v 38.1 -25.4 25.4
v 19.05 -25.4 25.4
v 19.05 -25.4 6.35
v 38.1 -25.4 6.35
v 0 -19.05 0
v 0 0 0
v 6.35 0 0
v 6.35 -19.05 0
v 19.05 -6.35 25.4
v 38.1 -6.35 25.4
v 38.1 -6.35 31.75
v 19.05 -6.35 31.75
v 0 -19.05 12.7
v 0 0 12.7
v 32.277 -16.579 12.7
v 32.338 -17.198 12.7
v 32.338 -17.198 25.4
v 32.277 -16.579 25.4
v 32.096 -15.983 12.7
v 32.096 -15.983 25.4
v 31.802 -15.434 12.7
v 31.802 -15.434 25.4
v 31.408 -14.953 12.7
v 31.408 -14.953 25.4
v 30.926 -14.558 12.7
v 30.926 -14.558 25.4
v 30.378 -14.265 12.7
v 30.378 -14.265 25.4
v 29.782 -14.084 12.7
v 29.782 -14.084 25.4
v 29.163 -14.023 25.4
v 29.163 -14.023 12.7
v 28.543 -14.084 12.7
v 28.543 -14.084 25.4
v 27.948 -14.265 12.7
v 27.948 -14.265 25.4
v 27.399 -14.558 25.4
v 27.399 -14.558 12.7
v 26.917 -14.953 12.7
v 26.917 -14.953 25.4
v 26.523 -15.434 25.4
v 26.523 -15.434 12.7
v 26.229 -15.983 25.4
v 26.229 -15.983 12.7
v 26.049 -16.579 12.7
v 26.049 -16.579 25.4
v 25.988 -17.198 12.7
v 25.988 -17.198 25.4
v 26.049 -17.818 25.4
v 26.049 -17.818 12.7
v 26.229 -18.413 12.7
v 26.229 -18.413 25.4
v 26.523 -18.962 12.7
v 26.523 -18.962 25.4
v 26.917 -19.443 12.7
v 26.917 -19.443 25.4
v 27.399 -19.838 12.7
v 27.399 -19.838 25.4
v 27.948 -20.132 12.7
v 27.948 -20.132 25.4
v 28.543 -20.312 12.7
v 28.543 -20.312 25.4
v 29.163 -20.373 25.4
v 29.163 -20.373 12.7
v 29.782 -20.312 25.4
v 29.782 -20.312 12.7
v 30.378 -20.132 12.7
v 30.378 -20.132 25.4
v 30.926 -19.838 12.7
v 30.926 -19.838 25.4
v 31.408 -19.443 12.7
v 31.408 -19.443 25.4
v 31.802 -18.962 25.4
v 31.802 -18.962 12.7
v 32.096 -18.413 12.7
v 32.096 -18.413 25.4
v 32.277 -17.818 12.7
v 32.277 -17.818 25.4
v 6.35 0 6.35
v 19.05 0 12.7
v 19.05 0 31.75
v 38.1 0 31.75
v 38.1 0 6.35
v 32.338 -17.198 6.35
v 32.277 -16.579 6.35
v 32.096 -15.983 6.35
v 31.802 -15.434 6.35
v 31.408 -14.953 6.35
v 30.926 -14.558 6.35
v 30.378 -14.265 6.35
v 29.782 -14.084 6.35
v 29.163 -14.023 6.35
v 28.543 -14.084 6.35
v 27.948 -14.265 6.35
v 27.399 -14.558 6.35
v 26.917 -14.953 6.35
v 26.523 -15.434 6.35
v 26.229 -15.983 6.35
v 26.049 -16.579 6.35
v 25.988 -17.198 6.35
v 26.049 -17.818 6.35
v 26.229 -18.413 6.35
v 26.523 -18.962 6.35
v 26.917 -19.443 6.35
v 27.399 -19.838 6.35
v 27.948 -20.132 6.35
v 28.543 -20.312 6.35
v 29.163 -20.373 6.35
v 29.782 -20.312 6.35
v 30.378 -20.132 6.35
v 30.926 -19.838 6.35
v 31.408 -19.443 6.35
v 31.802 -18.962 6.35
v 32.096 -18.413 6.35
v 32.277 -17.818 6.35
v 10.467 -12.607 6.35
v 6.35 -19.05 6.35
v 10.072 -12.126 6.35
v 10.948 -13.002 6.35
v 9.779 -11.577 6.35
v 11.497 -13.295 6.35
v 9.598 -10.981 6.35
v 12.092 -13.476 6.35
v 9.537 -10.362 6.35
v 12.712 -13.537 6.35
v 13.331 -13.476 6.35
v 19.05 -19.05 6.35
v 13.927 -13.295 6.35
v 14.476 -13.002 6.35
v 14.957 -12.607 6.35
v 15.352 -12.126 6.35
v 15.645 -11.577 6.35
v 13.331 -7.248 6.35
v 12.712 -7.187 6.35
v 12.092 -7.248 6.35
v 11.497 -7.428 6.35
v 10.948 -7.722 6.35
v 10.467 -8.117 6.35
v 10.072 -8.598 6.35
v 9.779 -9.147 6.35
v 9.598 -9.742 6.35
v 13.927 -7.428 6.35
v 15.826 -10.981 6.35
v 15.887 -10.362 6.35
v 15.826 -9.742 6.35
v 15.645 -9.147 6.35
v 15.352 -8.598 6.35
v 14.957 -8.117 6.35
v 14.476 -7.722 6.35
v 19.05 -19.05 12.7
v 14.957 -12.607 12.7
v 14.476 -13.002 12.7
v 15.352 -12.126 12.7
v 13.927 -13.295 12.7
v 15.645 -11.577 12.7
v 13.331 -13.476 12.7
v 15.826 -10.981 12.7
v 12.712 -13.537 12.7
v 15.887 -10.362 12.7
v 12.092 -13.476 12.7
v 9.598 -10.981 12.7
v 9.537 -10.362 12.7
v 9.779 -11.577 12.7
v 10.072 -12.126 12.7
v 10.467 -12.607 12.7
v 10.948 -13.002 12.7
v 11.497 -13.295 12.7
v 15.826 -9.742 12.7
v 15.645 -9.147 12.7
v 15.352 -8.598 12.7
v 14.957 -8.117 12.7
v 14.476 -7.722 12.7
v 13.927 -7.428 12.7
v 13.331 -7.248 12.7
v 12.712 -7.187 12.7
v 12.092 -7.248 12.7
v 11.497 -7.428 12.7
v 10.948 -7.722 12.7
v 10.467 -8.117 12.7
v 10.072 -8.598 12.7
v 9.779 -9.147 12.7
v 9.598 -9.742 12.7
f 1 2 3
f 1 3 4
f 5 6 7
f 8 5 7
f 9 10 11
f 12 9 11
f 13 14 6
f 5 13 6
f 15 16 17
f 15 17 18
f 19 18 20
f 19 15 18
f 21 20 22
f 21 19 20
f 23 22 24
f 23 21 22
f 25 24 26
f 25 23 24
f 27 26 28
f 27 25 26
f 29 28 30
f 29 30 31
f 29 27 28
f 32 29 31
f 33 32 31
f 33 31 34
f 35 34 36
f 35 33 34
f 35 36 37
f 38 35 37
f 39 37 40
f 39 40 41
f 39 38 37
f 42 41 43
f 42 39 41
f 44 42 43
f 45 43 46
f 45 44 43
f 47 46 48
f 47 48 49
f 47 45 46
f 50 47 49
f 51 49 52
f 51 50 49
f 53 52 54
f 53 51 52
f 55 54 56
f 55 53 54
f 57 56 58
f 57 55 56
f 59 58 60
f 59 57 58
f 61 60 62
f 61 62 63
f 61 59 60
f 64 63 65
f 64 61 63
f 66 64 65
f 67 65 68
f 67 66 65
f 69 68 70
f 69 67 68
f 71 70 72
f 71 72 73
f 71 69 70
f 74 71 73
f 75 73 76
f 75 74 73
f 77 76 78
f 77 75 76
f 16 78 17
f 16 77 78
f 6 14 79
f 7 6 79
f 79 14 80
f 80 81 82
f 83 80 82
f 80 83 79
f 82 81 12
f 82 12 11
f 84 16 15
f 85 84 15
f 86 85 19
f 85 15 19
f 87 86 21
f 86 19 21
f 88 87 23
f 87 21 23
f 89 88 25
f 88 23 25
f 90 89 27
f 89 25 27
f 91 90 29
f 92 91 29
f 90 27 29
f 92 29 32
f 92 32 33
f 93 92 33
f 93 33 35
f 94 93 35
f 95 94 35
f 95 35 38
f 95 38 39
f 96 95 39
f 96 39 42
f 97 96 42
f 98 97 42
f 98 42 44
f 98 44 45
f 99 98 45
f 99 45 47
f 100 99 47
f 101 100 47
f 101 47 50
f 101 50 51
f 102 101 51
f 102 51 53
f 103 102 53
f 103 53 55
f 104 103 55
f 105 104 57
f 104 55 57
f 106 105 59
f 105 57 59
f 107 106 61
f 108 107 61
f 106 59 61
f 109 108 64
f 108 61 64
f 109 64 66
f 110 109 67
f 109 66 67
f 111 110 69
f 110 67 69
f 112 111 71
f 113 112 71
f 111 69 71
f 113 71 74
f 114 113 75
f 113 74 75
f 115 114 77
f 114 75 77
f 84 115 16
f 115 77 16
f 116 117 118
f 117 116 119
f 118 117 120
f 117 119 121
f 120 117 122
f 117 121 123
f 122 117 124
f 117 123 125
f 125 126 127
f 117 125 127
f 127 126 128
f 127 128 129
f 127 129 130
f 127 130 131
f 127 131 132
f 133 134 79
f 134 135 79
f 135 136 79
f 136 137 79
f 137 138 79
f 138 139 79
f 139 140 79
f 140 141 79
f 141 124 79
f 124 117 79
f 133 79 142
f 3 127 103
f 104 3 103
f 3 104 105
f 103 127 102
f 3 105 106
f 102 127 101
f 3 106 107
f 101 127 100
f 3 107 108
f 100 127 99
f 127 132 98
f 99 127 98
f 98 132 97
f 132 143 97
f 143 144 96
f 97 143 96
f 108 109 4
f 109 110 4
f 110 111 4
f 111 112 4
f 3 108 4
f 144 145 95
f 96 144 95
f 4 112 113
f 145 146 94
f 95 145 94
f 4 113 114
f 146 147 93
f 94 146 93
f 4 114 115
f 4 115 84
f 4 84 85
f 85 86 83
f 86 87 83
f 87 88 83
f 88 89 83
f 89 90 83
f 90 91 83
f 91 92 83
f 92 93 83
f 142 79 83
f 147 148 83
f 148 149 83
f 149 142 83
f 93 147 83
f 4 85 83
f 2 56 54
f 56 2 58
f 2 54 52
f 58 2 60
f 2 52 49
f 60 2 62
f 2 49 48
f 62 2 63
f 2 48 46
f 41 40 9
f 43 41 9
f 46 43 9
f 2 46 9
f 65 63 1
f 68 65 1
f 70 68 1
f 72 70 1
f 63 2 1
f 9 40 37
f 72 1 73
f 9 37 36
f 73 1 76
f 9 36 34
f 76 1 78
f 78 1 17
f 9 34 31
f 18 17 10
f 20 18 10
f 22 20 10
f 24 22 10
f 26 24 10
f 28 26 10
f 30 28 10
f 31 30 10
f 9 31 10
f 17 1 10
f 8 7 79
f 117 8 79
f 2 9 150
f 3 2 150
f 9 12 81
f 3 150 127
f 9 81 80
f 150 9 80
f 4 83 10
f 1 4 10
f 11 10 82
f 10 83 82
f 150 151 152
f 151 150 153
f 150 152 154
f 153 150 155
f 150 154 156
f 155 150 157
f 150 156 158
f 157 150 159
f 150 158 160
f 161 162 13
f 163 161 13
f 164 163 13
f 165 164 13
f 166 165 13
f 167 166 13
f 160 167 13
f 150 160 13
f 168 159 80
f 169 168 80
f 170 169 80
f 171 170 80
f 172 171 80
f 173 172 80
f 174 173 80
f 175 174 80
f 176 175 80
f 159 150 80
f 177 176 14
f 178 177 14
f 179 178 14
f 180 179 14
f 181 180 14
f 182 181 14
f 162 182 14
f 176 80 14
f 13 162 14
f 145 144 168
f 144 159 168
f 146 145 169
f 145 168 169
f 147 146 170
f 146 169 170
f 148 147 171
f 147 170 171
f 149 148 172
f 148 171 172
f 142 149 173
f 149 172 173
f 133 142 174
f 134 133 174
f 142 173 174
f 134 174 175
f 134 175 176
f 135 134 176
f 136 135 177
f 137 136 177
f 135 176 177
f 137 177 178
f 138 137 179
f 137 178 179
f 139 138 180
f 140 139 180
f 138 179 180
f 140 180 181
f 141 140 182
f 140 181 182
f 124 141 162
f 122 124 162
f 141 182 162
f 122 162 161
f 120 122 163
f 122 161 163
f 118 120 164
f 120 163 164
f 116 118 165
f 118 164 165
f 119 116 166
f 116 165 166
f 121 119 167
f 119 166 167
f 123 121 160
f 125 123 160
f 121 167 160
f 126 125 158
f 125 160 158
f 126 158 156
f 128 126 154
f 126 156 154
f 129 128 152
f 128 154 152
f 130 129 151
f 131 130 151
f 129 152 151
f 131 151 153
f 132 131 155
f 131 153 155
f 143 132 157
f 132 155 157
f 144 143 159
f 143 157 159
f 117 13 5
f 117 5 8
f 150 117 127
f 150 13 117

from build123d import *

# Parameters (mm, degrees)
F0_W     = 19.05
F0_H     = 6.35
F1_DEPTH = 25.4
F2_W     = 19.05
F2_H     = 6.35
F3_DEPTH = 12.701
F4_W     = 19.05
F4_H     = 6.35
F5_DEPTH = 38.101
F6_R     = 3.175
F7_DEPTH = 12.7


with BuildPart() as f1:
    # F0 (on Front) → F1 (new body)
    with BuildSketch(Plane.XZ):
        Polygon((0, 12.7), (0, 0), (6.35, 0), (6.35, 6.35), (19.05, 6.35), (19.05, 12.7), align=None)
        Polygon((19.05, 25.4), (19.05, 12.7), (19.05, 6.35), (38.1, 6.35), (38.1, 12.7), (38.1, 25.4), align=None)
        with Locations((28.575, 28.575)):
            Rectangle(F0_W, F0_H)
    extrude(amount=F1_DEPTH)

    # F2 (on face) → F3 (cut, through all)
    with BuildSketch(Plane.XY.offset(12.7)):
        with Locations((9.525, -22.225)):
            Rectangle(F2_W, F2_H)
    extrude(amount=-F3_DEPTH, mode=Mode.SUBTRACT)

    # F4 (on face) → F5 (cut, through all)
    with BuildSketch(Plane.YZ.offset(38.1)):
        with Locations((-15.875, 28.575)):
            Rectangle(F4_W, F4_H)
    extrude(amount=-F5_DEPTH, mode=Mode.SUBTRACT)

    # F6 (on face) → F7 (cut, symmetric)
    with BuildSketch(Plane.XY.offset(12.7)):
        with Locations((29.162522, -17.198412)):
            Circle(F6_R)
        with Locations((12.71187, -10.361776)):
            Circle(F6_R)
    extrude(amount=F7_DEPTH, both=True, mode=Mode.SUBTRACT)


solid = f1.part
